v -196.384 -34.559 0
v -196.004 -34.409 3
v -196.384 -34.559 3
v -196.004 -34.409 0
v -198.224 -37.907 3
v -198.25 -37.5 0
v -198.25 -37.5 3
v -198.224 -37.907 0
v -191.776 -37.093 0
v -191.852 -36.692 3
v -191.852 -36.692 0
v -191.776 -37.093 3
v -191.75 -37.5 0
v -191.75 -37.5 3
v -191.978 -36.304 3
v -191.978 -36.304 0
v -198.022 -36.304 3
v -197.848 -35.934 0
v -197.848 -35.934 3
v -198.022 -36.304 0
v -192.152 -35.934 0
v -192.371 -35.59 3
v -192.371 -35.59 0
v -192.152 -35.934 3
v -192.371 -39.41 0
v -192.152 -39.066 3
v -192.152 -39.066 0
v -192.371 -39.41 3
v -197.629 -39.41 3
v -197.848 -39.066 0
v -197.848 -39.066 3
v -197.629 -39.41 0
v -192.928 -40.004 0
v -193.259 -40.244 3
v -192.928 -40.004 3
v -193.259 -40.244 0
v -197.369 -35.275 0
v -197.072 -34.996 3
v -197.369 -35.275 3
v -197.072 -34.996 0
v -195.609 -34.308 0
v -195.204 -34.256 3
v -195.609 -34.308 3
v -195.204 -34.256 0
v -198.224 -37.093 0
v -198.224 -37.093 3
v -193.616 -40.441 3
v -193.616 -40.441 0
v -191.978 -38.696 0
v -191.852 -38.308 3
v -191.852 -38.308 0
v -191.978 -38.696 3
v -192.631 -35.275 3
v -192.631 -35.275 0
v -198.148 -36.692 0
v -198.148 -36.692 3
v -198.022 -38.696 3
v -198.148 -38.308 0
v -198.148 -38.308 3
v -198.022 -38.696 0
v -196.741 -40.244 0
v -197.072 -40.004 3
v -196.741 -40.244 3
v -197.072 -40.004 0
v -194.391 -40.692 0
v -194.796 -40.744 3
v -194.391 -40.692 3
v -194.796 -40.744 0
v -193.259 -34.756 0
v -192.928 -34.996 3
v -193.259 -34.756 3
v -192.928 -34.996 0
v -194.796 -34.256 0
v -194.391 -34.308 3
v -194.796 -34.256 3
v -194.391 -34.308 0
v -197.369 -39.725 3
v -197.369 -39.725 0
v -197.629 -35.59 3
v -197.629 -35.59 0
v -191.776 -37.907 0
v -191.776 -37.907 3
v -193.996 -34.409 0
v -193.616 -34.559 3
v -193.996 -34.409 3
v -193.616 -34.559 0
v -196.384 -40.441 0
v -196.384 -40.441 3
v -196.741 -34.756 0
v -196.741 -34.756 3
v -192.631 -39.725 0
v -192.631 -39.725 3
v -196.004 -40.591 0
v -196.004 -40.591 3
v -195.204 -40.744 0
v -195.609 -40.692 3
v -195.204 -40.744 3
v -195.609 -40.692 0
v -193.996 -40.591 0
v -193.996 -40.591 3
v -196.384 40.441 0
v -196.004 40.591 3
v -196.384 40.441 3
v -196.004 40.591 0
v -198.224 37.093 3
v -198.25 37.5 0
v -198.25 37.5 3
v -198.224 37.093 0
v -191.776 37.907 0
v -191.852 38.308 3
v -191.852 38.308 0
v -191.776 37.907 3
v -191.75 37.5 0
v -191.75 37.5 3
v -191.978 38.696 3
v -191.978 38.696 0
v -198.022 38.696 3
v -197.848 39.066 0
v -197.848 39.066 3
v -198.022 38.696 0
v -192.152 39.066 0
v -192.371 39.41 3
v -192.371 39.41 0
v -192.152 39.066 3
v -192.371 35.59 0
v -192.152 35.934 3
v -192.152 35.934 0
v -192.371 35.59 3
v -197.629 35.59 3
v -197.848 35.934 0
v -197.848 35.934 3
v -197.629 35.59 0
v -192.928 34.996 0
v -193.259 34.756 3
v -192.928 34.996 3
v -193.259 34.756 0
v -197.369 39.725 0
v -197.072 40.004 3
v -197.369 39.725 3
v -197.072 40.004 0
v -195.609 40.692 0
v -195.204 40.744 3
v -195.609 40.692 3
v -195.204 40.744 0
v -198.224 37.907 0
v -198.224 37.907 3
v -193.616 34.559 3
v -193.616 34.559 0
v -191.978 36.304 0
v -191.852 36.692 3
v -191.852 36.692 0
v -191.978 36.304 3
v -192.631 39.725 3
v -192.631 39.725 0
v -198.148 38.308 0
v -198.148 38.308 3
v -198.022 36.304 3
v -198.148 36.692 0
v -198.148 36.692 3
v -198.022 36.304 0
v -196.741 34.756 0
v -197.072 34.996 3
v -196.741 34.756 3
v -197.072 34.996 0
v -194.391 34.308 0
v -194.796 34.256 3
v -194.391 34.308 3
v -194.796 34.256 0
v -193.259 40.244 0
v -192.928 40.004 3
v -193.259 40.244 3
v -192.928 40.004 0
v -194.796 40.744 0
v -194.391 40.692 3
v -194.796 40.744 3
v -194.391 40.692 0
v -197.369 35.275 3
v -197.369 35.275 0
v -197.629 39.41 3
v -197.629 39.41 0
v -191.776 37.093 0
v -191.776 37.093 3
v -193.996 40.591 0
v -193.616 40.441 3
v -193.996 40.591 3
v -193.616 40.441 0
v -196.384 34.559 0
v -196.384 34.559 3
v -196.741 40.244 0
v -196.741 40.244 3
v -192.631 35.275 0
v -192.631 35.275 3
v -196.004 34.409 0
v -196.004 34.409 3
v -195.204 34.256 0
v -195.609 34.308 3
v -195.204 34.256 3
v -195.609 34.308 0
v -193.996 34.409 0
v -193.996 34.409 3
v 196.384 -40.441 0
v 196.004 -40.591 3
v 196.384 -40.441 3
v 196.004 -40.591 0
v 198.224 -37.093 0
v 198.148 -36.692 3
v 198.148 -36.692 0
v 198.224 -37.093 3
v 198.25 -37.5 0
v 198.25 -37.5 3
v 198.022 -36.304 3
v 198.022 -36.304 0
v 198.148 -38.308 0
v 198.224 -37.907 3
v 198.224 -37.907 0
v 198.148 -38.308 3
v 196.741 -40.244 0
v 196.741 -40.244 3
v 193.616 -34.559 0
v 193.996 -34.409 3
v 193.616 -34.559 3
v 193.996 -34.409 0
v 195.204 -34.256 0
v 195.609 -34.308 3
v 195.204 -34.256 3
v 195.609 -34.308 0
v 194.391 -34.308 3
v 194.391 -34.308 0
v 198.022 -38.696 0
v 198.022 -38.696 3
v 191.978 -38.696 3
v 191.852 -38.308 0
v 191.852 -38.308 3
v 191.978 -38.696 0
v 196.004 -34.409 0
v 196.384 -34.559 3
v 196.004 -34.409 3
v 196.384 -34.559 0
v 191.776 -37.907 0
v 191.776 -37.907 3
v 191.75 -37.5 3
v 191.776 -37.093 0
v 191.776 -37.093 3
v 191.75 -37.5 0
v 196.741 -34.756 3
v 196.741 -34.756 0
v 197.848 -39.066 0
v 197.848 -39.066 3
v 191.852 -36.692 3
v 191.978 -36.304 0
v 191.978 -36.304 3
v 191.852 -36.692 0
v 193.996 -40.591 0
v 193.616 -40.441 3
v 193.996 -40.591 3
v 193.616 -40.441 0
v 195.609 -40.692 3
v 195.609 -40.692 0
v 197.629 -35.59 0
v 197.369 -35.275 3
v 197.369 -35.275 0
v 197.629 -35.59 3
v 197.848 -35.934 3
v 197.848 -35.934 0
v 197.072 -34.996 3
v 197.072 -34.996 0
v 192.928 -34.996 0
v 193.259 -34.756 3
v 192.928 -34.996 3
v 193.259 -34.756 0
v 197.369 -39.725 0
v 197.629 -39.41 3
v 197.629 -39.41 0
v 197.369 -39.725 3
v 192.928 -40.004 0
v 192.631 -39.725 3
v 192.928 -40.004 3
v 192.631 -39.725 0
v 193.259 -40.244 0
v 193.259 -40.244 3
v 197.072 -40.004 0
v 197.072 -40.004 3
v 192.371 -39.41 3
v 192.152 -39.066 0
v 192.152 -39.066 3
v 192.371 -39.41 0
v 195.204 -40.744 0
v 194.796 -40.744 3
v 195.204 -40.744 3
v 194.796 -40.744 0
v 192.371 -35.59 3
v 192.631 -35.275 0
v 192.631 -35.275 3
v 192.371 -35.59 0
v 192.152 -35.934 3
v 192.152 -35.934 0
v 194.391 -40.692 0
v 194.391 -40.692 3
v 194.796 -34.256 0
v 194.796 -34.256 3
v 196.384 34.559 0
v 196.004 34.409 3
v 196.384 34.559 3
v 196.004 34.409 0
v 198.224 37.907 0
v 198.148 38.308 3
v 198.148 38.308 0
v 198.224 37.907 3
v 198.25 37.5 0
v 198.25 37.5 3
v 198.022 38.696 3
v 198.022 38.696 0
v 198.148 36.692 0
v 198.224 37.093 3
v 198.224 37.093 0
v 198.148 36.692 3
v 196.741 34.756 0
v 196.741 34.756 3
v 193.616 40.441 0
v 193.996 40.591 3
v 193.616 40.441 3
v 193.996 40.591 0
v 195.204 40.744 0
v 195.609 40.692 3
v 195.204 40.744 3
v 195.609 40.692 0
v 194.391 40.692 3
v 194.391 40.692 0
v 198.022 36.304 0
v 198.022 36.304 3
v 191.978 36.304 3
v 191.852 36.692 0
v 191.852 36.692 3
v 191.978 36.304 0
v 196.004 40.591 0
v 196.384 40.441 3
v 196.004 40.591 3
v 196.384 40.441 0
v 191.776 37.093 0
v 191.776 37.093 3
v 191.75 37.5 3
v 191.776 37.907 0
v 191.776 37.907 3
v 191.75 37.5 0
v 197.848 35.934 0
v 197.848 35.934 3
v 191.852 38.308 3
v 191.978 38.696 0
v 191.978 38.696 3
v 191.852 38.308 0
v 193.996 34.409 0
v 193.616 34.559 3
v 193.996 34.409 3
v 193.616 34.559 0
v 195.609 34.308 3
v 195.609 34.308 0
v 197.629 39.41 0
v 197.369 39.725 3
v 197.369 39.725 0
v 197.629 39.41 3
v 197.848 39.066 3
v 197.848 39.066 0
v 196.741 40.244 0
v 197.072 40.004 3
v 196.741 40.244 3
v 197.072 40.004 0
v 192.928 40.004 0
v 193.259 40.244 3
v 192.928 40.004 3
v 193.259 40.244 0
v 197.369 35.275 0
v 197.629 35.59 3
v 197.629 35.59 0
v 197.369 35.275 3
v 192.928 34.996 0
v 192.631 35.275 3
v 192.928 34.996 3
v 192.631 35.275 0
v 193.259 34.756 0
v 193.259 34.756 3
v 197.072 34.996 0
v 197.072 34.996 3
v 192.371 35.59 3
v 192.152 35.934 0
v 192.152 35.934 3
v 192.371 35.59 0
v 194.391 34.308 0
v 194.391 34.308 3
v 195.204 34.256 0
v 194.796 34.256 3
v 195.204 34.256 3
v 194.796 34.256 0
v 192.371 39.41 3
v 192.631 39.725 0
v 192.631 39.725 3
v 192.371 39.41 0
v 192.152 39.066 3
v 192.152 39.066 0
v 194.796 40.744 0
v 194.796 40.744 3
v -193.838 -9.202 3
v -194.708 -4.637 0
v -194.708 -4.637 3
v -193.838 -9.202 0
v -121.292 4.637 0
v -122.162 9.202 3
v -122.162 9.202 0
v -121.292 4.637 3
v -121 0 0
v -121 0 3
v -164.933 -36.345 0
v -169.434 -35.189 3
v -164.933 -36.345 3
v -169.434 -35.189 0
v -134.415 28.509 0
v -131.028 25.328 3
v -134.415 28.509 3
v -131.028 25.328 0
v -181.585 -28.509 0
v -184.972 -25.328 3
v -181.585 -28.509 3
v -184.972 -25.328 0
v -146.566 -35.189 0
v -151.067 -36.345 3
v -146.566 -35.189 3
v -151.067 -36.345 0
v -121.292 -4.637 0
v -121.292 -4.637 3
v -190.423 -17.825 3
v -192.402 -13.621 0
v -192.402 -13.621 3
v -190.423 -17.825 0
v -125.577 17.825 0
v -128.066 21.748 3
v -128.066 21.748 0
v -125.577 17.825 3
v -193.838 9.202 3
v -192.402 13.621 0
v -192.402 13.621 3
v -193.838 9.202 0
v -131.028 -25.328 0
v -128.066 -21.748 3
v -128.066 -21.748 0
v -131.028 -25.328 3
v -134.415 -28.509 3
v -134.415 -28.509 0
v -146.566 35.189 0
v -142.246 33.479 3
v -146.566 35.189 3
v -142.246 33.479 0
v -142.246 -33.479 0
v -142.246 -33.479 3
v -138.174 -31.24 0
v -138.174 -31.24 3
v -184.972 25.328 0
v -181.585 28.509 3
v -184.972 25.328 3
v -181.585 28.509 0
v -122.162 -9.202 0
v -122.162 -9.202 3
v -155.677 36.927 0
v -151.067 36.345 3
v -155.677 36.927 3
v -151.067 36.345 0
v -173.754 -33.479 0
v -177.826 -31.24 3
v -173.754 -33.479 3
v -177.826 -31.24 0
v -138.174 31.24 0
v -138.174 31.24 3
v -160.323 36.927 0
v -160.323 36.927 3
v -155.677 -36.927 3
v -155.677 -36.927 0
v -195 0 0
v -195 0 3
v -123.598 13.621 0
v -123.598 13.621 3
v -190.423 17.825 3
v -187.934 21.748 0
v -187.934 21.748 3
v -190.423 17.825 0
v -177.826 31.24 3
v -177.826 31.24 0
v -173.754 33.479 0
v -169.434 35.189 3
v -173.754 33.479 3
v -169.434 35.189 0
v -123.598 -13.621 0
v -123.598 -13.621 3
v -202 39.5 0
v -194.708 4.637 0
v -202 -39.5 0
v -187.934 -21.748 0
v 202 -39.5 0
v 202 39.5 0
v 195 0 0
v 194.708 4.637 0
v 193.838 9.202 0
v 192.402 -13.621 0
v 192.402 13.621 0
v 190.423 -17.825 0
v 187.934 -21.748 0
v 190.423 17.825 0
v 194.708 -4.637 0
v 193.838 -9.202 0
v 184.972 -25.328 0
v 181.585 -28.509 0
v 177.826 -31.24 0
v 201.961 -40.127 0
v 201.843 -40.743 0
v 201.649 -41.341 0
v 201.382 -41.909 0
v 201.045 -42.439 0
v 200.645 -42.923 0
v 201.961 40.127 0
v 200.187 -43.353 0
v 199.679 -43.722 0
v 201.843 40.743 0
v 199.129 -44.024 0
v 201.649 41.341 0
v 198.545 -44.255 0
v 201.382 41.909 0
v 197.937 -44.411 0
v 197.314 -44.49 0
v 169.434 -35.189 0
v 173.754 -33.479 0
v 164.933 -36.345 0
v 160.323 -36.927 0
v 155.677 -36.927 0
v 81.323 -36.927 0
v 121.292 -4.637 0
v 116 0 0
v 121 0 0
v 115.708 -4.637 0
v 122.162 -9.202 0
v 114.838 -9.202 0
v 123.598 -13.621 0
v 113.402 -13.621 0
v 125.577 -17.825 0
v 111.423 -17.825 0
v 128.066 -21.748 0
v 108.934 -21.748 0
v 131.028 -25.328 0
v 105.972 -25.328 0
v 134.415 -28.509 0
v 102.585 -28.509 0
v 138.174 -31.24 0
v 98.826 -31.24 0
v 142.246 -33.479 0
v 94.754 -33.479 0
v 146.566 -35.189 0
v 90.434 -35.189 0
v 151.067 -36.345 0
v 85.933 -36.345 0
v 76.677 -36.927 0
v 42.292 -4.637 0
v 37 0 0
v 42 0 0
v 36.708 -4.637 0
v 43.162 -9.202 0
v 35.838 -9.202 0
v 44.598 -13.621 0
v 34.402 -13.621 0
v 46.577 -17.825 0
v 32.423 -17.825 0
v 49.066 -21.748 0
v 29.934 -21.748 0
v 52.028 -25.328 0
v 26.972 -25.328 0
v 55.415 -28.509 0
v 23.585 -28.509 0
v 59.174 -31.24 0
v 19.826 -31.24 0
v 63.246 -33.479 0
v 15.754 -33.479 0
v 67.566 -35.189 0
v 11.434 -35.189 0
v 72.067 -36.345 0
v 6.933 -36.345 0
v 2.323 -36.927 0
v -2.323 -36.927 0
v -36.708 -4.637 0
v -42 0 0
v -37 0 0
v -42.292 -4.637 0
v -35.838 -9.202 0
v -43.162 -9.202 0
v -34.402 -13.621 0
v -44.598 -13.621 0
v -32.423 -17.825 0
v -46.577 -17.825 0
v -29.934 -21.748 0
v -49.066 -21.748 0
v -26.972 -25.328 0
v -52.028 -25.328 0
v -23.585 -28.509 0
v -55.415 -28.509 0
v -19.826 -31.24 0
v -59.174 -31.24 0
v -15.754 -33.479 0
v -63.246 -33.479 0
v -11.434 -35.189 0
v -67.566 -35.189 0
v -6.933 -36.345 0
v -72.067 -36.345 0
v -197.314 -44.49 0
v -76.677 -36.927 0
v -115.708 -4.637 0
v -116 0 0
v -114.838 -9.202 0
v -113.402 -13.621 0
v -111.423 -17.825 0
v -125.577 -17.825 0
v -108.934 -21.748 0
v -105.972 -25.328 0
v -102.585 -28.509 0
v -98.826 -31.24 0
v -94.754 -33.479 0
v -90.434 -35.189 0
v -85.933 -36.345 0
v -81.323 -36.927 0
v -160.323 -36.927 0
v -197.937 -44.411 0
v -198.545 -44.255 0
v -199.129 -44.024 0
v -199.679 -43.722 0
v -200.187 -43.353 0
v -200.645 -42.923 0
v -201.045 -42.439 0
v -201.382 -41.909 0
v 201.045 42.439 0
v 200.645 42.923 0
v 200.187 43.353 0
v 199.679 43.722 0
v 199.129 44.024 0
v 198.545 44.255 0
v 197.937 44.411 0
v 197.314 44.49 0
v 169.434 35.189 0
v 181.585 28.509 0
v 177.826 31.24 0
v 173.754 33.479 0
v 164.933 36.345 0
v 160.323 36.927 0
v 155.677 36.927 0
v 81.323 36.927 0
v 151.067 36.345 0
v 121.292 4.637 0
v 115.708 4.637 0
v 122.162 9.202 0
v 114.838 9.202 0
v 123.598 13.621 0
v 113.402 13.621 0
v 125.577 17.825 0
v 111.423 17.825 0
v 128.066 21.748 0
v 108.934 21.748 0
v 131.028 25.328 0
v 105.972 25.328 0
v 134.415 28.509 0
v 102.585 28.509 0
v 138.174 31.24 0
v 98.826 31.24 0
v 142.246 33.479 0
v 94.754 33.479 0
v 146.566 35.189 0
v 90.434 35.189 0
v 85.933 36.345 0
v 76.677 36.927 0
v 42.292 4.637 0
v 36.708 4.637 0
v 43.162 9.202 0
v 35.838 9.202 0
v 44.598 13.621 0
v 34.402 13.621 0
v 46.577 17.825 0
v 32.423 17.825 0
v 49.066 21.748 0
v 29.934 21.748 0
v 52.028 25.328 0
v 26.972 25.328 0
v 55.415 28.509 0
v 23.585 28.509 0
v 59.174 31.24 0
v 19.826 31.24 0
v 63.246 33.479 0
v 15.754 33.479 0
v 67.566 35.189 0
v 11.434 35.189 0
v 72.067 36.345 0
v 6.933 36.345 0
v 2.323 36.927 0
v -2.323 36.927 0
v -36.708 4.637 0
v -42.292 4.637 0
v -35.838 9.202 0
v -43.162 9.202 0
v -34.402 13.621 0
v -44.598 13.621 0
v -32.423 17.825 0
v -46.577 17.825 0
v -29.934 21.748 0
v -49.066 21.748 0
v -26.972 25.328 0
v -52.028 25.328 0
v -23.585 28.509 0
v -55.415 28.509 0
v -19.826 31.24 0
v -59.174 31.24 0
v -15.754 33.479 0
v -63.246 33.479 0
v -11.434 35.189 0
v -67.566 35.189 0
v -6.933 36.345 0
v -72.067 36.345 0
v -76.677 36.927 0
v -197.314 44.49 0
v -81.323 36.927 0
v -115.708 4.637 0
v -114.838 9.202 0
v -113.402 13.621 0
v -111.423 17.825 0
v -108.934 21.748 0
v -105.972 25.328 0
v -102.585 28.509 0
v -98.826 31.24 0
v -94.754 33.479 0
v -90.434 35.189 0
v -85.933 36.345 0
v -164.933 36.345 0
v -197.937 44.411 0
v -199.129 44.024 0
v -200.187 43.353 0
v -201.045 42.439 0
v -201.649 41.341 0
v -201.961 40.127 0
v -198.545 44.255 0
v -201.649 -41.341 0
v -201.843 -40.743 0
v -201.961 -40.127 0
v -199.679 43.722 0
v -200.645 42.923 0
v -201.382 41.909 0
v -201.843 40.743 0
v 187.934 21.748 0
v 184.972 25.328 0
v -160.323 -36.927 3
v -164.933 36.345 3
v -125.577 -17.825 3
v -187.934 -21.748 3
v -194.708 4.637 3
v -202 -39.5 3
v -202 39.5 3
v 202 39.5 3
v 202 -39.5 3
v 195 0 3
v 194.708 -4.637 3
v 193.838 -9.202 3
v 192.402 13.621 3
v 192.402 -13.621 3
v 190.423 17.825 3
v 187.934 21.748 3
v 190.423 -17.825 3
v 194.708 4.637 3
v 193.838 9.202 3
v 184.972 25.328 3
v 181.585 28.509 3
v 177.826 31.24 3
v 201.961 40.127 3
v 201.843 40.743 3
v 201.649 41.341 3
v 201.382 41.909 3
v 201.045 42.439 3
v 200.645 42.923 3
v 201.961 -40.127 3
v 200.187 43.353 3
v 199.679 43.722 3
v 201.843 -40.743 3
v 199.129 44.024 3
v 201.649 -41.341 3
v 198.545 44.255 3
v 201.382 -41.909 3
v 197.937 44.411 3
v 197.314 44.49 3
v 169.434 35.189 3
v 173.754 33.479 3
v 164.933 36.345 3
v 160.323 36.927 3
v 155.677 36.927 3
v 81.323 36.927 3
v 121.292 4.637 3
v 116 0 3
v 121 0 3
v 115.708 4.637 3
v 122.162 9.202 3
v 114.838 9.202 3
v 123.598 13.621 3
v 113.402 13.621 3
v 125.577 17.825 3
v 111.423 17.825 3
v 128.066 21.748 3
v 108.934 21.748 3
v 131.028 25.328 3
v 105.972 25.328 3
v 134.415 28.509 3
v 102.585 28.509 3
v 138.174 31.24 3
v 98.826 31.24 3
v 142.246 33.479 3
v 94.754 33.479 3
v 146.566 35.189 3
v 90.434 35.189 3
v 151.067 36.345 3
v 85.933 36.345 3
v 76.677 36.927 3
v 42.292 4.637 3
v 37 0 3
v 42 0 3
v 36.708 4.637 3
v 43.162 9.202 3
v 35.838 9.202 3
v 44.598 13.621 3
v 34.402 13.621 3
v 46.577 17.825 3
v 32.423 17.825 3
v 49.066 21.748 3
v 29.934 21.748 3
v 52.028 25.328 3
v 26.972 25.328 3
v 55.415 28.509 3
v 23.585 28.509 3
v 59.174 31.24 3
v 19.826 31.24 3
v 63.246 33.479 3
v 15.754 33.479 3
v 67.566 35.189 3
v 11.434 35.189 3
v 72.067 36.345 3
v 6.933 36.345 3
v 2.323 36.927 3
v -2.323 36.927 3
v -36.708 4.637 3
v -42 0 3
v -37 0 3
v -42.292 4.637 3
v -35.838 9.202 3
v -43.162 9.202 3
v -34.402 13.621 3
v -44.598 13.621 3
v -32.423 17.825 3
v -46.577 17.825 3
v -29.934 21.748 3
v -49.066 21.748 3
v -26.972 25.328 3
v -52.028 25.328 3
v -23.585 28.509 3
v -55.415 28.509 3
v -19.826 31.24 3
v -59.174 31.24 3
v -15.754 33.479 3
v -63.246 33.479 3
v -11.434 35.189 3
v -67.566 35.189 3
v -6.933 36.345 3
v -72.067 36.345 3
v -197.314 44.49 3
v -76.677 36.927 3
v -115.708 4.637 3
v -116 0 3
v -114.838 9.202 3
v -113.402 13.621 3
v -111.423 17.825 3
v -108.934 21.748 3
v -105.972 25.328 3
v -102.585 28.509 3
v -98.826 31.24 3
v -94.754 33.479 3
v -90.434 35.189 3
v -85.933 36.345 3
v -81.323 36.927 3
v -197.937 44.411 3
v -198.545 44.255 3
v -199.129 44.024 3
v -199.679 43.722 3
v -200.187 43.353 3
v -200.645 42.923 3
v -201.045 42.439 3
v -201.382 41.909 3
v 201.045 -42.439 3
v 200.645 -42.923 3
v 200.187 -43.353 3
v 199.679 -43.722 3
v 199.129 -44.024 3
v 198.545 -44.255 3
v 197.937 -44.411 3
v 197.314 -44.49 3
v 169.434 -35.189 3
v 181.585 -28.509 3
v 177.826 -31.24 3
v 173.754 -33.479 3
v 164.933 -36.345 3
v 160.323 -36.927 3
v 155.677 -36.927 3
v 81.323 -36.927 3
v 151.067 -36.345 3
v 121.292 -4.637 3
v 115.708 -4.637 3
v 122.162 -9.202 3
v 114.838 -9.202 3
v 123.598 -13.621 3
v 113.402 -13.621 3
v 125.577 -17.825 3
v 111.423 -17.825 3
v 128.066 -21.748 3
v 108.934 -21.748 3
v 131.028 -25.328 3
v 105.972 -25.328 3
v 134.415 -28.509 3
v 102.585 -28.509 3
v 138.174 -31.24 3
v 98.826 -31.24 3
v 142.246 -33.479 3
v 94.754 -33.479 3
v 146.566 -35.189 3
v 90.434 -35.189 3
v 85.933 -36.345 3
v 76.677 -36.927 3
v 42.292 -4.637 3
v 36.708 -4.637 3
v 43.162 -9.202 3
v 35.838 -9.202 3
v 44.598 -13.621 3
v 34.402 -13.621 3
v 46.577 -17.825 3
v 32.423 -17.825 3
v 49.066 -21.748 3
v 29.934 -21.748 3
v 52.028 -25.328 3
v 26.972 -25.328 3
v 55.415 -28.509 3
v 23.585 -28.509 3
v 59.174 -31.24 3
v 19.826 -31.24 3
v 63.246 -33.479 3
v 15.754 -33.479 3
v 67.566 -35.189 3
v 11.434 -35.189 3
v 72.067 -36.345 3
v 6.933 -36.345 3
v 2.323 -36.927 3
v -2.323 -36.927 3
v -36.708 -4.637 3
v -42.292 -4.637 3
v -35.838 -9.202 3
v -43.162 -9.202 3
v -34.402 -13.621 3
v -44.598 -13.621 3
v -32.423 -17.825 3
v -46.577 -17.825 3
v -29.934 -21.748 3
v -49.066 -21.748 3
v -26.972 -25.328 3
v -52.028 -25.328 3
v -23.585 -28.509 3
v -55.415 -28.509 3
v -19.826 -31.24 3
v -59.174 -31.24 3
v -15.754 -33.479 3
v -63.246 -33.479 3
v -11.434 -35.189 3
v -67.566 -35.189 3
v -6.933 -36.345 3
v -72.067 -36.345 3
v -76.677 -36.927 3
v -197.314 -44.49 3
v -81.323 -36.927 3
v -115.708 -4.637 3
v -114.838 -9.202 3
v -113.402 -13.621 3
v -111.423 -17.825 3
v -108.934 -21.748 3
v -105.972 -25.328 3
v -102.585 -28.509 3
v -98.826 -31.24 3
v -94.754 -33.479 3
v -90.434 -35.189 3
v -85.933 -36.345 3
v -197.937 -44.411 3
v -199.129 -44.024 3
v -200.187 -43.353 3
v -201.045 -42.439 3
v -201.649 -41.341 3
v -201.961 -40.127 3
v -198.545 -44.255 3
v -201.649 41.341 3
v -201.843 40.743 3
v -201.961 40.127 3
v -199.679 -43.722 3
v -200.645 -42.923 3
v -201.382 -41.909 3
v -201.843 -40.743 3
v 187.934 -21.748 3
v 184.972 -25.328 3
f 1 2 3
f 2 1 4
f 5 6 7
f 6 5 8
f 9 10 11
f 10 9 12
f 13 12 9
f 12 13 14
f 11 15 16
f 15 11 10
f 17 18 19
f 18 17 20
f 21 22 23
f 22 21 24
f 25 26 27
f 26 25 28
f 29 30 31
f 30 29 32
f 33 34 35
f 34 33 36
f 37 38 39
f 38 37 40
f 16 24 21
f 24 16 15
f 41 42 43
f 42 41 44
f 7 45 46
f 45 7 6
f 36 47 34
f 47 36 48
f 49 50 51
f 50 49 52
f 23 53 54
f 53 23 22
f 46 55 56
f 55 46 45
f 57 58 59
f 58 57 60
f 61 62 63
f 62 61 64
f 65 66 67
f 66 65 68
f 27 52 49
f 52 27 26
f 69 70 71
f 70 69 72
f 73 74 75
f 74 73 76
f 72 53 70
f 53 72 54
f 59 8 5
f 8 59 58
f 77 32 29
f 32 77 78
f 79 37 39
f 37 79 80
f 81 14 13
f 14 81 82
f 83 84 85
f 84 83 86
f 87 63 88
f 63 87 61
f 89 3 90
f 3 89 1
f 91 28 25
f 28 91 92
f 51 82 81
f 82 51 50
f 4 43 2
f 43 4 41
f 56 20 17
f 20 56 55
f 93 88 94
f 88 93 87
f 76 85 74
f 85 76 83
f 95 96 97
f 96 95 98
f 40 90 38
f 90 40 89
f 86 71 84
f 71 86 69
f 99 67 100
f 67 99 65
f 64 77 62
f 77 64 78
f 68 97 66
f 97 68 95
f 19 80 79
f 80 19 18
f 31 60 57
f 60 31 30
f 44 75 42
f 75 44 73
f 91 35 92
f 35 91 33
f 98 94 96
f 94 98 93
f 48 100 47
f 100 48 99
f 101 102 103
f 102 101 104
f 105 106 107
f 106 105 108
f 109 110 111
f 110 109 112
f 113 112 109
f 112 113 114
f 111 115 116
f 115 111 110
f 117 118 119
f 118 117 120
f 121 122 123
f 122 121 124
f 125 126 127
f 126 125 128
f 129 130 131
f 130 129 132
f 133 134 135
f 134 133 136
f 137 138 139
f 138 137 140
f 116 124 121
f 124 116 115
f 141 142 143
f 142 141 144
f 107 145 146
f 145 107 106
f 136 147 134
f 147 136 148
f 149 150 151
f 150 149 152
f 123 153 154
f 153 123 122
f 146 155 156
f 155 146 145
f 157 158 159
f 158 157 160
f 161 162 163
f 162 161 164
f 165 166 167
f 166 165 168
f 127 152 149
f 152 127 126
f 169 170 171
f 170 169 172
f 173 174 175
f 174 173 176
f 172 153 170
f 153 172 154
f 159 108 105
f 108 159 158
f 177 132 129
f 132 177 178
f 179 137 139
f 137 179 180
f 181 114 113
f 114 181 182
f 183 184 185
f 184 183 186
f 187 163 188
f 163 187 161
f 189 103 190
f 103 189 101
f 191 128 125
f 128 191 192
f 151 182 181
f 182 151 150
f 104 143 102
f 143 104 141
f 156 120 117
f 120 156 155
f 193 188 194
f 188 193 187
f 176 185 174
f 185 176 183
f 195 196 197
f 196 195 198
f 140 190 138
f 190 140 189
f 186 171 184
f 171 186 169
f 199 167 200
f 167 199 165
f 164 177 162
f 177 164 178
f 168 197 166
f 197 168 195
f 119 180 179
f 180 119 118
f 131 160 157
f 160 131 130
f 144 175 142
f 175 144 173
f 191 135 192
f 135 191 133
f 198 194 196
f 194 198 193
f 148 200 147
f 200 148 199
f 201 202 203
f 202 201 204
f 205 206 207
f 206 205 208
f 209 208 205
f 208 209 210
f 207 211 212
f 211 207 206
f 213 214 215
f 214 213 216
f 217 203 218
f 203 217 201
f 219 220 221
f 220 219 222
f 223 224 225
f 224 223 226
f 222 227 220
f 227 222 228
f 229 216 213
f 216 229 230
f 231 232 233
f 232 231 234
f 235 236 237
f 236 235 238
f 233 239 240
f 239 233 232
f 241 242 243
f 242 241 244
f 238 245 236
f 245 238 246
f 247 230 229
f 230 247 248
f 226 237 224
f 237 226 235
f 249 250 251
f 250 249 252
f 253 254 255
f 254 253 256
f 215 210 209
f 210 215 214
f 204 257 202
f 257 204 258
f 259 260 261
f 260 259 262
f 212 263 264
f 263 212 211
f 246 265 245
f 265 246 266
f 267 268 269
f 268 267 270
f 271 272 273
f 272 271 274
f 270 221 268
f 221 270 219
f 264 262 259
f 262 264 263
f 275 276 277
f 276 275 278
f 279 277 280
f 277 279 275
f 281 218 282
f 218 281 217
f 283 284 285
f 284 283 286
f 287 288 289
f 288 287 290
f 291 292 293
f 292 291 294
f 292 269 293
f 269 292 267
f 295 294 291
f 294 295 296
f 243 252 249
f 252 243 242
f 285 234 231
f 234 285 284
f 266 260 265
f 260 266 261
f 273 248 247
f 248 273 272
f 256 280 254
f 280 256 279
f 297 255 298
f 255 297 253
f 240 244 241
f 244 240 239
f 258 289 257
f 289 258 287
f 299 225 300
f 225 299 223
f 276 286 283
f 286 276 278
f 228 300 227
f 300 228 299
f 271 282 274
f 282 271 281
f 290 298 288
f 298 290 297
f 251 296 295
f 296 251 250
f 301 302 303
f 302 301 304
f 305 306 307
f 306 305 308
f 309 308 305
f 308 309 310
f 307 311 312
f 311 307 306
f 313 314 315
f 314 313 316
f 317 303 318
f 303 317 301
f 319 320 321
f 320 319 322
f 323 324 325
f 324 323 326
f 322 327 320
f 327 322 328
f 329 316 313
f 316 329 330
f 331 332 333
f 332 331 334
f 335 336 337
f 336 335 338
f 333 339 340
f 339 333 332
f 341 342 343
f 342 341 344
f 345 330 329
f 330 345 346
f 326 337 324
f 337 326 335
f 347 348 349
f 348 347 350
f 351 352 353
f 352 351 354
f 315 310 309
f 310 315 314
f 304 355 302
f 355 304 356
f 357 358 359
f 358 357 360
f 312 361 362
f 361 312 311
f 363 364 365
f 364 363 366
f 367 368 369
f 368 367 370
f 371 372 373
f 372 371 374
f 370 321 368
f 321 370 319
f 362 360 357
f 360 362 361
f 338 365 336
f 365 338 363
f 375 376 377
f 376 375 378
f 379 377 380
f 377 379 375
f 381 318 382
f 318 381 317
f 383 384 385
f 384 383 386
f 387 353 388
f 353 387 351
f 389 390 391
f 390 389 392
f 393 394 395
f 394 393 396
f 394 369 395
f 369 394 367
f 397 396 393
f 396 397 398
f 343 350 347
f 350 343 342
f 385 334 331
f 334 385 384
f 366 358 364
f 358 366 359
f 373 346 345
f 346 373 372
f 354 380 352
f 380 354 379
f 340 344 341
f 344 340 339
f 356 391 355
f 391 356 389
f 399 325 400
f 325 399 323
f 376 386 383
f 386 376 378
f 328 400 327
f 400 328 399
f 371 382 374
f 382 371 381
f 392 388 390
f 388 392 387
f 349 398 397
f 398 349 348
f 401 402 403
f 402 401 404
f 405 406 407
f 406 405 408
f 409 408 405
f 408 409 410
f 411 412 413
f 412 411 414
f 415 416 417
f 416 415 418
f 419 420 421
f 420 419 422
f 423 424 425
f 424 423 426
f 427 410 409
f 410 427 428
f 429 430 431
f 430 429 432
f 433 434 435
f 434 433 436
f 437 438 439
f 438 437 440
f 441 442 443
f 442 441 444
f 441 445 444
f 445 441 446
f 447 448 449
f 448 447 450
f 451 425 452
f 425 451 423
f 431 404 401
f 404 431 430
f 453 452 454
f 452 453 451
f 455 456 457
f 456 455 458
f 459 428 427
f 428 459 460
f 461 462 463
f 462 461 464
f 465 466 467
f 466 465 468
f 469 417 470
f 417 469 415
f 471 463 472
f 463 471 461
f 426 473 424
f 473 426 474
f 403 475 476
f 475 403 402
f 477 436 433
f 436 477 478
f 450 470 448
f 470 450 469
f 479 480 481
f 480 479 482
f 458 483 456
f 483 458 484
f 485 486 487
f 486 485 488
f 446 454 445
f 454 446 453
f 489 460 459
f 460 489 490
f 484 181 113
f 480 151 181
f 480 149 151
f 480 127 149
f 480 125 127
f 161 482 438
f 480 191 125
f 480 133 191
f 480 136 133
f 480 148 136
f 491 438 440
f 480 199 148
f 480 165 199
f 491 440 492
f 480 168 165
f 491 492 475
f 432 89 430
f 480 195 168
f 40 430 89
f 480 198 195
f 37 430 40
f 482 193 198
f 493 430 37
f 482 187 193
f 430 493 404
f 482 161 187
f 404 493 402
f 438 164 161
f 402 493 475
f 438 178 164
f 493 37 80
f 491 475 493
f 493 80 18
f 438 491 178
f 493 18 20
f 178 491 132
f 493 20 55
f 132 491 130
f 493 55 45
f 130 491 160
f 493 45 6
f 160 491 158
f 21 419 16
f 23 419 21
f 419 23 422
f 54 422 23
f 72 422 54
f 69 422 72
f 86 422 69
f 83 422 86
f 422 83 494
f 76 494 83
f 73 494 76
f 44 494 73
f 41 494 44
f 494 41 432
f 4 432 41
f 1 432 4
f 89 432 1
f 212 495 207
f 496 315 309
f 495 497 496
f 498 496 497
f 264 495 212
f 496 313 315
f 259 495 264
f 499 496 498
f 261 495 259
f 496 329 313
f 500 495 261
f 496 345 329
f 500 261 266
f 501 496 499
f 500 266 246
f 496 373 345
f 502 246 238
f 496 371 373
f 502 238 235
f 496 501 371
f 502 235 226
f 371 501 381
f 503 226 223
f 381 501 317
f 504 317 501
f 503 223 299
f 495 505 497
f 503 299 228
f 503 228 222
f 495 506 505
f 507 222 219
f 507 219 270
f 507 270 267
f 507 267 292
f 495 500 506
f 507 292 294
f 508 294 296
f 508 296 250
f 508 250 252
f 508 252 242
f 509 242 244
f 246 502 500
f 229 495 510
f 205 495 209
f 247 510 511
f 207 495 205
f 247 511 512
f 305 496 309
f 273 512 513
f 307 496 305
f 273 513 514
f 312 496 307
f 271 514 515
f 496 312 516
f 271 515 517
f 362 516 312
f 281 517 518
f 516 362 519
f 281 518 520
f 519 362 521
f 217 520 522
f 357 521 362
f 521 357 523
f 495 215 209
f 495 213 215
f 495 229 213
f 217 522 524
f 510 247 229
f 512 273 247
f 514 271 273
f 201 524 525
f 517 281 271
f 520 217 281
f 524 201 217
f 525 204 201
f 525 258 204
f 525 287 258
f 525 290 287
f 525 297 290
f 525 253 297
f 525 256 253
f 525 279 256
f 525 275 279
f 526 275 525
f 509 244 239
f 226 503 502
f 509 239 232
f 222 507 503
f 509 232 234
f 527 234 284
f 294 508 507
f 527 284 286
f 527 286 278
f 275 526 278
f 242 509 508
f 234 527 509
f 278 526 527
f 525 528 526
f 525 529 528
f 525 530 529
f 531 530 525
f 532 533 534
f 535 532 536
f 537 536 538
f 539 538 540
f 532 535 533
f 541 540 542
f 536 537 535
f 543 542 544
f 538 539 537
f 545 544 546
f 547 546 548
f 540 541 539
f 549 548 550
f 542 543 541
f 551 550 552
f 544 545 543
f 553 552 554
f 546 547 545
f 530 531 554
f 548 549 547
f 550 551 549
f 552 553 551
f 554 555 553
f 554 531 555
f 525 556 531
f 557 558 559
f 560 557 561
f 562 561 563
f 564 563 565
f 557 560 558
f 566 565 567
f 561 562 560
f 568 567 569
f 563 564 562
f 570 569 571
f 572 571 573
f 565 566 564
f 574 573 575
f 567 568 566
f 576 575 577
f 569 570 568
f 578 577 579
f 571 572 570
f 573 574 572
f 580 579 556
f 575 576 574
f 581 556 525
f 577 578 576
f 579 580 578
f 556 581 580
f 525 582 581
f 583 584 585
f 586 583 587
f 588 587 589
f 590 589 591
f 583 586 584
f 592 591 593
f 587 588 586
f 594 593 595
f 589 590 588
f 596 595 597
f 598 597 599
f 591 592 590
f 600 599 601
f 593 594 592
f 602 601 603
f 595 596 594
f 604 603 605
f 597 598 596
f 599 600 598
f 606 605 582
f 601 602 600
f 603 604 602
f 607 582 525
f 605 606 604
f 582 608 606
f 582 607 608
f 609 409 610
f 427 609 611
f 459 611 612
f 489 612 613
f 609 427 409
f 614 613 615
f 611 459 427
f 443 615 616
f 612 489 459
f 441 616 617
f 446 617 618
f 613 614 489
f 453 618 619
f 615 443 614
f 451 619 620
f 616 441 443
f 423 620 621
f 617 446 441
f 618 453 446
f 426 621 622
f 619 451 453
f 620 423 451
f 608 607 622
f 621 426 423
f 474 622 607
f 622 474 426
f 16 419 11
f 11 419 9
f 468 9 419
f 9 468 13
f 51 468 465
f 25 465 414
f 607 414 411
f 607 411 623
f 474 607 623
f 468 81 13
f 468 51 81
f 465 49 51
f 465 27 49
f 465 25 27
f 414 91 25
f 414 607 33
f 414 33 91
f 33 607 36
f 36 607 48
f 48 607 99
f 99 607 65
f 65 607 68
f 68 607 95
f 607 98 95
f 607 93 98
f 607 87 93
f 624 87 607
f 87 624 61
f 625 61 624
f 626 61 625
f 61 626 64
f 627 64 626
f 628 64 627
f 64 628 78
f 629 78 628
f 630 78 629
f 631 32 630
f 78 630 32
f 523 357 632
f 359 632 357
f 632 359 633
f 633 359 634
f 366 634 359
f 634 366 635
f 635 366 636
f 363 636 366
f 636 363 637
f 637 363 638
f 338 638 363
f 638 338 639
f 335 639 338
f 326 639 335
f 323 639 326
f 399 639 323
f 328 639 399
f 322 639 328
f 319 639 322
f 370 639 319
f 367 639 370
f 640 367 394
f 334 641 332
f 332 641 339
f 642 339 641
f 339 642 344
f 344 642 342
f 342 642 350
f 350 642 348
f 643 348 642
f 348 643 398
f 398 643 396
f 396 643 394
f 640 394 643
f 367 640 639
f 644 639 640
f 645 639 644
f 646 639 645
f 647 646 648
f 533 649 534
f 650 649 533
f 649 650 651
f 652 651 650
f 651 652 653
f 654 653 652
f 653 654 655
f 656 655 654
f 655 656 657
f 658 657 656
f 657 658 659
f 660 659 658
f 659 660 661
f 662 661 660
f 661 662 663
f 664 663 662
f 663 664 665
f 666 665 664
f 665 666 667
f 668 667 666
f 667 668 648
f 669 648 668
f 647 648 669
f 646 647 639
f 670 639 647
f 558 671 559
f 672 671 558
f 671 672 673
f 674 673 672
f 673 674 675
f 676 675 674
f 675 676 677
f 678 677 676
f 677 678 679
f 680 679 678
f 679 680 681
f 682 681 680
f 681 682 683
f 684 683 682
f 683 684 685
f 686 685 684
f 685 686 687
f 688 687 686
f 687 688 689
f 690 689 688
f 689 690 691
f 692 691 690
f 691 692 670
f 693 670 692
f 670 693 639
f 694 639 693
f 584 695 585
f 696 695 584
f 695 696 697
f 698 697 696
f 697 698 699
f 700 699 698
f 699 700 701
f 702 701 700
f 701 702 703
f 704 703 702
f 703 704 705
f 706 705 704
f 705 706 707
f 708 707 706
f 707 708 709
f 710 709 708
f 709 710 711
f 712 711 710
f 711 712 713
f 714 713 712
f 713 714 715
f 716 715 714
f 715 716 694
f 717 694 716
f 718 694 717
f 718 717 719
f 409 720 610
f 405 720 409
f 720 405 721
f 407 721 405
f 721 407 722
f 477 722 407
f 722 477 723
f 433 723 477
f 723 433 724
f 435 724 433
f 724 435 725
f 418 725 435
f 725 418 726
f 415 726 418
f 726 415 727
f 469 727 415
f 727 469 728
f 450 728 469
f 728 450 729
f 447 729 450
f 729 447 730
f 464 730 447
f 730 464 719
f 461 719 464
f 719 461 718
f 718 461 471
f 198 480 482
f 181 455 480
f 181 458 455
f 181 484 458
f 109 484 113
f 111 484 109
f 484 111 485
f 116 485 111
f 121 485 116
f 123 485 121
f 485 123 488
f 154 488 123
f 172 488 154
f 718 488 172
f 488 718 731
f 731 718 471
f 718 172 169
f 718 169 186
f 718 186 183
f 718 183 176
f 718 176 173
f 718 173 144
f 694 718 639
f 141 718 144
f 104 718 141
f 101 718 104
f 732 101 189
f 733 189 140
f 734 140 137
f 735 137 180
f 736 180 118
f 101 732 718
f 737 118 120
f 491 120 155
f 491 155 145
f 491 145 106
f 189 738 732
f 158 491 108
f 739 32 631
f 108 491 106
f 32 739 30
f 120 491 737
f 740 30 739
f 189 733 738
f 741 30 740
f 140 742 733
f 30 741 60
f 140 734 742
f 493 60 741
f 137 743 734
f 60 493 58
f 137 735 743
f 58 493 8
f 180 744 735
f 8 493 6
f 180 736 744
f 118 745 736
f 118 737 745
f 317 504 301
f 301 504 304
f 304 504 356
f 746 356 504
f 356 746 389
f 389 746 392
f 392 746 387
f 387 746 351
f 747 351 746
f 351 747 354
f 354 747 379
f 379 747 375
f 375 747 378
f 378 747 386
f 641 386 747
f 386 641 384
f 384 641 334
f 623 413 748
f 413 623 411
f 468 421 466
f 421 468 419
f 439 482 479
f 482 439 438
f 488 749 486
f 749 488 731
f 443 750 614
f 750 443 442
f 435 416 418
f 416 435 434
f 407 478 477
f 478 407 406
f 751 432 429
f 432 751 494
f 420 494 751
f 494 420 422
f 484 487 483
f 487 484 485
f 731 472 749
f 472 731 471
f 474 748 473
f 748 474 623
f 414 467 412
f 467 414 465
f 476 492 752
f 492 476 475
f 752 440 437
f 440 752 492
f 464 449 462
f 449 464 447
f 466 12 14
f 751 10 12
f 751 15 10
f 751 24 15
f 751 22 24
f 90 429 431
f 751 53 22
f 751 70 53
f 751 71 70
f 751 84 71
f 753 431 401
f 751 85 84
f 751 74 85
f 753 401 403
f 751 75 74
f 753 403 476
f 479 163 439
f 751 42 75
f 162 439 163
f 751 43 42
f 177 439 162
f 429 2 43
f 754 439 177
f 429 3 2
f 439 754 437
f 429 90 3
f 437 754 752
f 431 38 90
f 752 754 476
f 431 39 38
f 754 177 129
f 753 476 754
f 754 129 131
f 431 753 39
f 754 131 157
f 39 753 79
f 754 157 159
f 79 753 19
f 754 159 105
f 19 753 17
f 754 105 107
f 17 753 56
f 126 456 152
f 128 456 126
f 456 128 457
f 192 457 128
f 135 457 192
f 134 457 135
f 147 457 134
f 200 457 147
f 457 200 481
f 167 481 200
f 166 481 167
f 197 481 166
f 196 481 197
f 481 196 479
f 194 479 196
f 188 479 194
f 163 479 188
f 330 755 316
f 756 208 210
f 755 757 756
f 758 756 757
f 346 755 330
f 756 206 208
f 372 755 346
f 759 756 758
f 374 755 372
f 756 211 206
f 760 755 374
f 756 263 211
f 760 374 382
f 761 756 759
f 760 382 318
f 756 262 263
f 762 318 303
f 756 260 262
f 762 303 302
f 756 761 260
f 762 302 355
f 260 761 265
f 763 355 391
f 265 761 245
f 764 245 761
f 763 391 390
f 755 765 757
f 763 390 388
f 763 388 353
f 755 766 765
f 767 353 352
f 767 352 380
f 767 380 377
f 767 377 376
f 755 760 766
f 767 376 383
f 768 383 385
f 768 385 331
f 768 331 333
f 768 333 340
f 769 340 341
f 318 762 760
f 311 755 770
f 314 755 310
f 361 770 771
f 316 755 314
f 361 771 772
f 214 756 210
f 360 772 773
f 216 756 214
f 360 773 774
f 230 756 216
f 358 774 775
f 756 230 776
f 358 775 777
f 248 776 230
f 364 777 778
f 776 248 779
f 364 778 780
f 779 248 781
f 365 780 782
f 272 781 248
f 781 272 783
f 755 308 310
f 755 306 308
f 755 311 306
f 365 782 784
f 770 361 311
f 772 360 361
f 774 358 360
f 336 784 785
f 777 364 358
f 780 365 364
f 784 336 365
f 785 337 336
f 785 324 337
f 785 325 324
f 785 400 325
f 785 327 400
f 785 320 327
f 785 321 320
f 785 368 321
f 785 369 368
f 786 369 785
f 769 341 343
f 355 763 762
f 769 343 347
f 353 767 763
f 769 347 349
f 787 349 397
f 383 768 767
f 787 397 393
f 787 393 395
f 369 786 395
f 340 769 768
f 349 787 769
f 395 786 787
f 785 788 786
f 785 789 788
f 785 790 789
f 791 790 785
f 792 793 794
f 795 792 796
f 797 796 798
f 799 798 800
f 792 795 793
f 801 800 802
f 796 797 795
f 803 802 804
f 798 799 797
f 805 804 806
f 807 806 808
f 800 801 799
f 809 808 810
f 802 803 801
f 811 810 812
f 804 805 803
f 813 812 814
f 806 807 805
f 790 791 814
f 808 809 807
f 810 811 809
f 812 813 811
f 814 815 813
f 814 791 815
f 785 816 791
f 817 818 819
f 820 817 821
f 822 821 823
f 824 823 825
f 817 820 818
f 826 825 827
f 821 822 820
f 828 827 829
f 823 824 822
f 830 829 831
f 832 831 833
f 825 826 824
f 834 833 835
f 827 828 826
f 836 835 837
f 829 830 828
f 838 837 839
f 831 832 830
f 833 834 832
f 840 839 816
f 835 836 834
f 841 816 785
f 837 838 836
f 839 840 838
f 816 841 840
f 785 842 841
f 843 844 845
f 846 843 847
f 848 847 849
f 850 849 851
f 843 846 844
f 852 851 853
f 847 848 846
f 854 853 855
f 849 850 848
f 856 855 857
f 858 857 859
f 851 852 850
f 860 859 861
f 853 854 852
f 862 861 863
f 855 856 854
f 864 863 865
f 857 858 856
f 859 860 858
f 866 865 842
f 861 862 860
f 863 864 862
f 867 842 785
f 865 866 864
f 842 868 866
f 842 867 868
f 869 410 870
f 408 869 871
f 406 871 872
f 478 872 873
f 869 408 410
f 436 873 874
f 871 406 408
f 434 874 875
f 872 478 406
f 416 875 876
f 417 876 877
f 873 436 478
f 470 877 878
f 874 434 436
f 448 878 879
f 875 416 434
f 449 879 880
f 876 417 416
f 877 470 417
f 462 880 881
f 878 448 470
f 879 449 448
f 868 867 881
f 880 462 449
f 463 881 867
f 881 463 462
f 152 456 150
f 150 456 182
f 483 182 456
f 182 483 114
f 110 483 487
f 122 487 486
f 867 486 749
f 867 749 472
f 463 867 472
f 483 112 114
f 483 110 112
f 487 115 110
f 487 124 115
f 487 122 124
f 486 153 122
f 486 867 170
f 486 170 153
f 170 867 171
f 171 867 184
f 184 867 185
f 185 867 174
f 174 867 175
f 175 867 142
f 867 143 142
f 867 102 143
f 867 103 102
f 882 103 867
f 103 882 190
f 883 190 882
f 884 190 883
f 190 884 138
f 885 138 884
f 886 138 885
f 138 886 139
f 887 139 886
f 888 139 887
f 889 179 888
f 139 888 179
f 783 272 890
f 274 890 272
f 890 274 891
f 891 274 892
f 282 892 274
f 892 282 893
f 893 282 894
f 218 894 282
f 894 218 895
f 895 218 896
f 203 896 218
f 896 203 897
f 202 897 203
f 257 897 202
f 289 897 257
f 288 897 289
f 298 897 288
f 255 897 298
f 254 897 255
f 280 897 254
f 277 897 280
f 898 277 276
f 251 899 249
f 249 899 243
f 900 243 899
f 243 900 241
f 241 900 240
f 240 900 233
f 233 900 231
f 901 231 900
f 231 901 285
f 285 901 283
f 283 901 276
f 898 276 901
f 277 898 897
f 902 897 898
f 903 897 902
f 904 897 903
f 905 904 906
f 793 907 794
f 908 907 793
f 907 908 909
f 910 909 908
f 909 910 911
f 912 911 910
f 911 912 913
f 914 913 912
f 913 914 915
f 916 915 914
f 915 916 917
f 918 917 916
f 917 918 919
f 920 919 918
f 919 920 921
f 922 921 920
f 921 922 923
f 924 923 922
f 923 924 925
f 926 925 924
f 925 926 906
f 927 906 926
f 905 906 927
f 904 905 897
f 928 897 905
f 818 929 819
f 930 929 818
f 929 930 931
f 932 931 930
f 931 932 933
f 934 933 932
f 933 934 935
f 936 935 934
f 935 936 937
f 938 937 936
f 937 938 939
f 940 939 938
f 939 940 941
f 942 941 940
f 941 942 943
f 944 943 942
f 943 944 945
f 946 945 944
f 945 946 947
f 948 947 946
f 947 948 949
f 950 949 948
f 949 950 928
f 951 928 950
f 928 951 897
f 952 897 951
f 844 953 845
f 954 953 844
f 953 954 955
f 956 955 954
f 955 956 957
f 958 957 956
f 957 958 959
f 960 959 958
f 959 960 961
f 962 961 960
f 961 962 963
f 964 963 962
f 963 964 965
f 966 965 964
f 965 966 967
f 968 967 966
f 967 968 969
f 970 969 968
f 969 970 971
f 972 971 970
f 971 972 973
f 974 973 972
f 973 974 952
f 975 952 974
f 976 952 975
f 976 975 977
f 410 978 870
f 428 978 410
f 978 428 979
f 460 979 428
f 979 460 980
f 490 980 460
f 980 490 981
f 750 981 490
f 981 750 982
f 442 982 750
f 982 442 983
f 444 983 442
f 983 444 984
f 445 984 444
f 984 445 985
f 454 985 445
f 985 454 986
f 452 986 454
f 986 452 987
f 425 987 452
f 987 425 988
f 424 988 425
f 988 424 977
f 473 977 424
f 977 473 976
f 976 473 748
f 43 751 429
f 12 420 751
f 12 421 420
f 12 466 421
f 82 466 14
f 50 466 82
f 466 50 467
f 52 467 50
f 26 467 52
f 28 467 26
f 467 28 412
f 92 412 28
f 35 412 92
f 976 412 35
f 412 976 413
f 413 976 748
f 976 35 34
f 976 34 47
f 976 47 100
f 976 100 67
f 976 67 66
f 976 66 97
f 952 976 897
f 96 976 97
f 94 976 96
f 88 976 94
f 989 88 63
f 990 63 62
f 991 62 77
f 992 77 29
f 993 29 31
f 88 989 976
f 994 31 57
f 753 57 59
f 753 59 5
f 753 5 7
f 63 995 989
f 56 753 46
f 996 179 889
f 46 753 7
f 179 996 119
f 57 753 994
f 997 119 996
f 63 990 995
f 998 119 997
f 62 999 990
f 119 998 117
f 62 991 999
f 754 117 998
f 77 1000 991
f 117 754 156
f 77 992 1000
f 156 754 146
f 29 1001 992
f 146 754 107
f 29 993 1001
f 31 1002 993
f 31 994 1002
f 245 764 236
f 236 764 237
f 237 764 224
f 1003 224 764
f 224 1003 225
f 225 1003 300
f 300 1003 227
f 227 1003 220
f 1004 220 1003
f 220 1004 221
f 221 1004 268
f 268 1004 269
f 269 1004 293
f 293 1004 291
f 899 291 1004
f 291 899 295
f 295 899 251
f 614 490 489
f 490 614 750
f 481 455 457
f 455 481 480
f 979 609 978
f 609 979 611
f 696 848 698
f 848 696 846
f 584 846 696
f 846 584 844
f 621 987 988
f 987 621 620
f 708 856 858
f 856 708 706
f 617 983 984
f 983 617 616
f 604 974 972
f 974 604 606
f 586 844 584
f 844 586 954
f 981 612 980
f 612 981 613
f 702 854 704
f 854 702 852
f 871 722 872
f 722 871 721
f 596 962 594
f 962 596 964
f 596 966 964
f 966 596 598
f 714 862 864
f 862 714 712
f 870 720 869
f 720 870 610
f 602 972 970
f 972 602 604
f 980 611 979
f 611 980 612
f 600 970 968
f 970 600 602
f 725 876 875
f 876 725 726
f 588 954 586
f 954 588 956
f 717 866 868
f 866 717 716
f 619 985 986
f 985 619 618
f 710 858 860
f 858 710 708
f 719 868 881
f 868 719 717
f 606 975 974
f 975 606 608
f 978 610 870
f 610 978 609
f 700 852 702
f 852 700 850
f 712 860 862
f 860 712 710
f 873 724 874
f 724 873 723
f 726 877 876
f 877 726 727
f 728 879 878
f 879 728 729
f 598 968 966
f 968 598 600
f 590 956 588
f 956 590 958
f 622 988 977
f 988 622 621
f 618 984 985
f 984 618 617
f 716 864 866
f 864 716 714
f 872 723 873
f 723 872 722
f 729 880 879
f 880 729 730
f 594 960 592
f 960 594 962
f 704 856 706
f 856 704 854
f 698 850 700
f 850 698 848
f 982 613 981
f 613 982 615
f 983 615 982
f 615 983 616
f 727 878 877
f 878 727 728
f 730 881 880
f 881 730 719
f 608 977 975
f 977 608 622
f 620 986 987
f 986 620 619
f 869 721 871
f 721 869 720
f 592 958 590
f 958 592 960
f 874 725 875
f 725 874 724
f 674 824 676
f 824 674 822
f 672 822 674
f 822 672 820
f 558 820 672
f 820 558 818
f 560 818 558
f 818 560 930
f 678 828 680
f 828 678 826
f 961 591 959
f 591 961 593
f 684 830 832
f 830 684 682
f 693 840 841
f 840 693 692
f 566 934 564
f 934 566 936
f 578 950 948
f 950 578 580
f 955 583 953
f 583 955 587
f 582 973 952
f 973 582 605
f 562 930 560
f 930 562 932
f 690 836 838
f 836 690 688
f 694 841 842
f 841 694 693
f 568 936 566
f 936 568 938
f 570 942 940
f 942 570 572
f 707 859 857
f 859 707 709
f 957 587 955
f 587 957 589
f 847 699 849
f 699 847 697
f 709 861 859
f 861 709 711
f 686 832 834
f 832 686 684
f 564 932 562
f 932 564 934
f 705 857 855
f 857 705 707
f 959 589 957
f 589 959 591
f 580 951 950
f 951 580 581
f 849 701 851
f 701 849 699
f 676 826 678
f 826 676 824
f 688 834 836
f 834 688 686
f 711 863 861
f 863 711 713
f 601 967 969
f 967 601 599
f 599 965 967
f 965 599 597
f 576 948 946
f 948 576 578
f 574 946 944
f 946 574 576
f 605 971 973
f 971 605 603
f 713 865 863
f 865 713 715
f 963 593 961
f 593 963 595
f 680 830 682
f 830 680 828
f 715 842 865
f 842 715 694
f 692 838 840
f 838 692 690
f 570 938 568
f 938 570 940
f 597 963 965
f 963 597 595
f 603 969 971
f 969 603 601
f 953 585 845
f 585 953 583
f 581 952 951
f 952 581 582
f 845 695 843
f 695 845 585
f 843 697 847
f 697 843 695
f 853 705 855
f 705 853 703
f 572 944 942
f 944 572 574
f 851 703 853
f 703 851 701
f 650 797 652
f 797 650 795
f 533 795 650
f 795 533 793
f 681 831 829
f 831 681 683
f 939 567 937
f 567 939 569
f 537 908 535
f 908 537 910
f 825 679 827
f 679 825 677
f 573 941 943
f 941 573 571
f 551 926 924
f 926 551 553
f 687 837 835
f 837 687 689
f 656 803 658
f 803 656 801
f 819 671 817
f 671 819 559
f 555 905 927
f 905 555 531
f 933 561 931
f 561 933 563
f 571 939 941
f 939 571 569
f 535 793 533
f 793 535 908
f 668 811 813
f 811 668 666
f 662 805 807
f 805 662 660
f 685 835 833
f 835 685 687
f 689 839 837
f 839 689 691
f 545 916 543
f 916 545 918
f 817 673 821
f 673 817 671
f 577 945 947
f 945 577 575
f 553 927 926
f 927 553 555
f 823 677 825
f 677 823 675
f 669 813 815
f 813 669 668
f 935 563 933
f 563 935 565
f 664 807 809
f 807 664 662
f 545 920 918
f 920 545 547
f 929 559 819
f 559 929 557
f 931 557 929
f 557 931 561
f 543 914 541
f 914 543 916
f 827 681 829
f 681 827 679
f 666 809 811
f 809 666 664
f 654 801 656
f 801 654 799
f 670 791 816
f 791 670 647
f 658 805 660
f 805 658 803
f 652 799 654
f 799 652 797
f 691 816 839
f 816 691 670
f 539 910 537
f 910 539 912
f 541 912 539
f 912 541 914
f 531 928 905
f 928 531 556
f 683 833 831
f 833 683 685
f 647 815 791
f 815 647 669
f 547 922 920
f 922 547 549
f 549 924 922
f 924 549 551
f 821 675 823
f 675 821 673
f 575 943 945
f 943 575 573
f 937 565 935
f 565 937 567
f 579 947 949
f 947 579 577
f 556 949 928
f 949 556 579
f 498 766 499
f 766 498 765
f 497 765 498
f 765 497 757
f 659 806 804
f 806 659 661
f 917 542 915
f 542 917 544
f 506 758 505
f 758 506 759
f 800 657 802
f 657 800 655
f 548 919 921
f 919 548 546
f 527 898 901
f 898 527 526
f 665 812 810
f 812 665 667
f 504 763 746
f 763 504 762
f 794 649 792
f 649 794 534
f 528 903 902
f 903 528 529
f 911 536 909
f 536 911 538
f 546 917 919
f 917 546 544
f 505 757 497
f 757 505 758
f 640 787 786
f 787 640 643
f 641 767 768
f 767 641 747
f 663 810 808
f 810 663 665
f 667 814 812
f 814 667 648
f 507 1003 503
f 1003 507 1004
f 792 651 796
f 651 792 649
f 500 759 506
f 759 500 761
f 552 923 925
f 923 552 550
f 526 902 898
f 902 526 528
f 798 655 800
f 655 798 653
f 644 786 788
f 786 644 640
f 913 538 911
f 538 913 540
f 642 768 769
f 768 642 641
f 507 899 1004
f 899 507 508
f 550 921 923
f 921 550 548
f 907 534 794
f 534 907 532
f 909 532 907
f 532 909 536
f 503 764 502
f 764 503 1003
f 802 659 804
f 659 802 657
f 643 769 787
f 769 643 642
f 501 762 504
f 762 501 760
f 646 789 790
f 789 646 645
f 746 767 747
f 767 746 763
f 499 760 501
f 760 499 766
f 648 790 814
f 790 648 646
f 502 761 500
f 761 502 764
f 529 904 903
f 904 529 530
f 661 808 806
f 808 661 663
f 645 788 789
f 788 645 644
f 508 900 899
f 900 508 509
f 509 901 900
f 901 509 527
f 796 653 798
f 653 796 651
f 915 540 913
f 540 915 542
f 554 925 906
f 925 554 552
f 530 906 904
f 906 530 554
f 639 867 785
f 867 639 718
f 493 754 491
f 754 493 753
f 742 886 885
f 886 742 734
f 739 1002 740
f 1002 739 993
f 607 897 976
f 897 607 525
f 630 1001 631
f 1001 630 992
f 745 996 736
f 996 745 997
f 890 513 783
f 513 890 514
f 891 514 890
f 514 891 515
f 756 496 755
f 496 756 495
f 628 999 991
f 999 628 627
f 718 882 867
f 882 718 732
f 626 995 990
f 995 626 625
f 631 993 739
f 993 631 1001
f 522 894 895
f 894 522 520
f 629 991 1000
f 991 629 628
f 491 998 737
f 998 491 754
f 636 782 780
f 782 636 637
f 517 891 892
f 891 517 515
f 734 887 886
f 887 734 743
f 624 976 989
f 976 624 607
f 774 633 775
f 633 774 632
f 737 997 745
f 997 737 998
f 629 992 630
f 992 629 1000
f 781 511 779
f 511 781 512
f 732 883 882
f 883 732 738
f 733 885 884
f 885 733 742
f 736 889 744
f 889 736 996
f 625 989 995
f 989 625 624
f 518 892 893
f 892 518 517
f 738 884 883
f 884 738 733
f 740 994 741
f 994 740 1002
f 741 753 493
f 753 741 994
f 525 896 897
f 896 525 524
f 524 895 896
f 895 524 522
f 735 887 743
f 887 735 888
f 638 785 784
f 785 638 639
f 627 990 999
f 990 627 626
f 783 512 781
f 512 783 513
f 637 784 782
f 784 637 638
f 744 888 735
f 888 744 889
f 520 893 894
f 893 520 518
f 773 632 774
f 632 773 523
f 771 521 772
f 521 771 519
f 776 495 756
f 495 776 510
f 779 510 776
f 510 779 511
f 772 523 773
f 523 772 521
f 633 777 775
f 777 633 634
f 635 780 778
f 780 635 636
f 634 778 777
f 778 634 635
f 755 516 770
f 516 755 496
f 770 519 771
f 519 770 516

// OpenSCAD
$fn = 50;


difference() {
	union() {
		hull() {
			translate(v = [-197.0000000000, 39.5000000000, 0]) {
				cylinder(h = 3, r = 5);
			}
			translate(v = [197.0000000000, 39.5000000000, 0]) {
				cylinder(h = 3, r = 5);
			}
			translate(v = [-197.0000000000, -39.5000000000, 0]) {
				cylinder(h = 3, r = 5);
			}
			translate(v = [197.0000000000, -39.5000000000, 0]) {
				cylinder(h = 3, r = 5);
			}
		}
	}
	union() {
		#translate(v = [-195.0000000000, -37.5000000000, -100.0000000000]) {
			cylinder(h = 200, r = 3.2500000000);
		}
		#translate(v = [-195.0000000000, 37.5000000000, -100.0000000000]) {
			cylinder(h = 200, r = 3.2500000000);
		}
		#translate(v = [195.0000000000, -37.5000000000, -100.0000000000]) {
			cylinder(h = 200, r = 3.2500000000);
		}
		#translate(v = [195.0000000000, 37.5000000000, -100.0000000000]) {
			cylinder(h = 200, r = 3.2500000000);
		}
		#translate(v = [-158.0000000000, 0, 0]) {
			cylinder(h = 3, r = 37.0000000000);
		}
		#translate(v = [-79.0000000000, 0, 0]) {
			cylinder(h = 3, r = 37.0000000000);
		}
		#cylinder(h = 3, r = 37.0000000000);
		#translate(v = [79.0000000000, 0, 0]) {
			cylinder(h = 3, r = 37.0000000000);
		}
		#translate(v = [158.0000000000, 0, 0]) {
			cylinder(h = 3, r = 37.0000000000);
		}
	}
}
